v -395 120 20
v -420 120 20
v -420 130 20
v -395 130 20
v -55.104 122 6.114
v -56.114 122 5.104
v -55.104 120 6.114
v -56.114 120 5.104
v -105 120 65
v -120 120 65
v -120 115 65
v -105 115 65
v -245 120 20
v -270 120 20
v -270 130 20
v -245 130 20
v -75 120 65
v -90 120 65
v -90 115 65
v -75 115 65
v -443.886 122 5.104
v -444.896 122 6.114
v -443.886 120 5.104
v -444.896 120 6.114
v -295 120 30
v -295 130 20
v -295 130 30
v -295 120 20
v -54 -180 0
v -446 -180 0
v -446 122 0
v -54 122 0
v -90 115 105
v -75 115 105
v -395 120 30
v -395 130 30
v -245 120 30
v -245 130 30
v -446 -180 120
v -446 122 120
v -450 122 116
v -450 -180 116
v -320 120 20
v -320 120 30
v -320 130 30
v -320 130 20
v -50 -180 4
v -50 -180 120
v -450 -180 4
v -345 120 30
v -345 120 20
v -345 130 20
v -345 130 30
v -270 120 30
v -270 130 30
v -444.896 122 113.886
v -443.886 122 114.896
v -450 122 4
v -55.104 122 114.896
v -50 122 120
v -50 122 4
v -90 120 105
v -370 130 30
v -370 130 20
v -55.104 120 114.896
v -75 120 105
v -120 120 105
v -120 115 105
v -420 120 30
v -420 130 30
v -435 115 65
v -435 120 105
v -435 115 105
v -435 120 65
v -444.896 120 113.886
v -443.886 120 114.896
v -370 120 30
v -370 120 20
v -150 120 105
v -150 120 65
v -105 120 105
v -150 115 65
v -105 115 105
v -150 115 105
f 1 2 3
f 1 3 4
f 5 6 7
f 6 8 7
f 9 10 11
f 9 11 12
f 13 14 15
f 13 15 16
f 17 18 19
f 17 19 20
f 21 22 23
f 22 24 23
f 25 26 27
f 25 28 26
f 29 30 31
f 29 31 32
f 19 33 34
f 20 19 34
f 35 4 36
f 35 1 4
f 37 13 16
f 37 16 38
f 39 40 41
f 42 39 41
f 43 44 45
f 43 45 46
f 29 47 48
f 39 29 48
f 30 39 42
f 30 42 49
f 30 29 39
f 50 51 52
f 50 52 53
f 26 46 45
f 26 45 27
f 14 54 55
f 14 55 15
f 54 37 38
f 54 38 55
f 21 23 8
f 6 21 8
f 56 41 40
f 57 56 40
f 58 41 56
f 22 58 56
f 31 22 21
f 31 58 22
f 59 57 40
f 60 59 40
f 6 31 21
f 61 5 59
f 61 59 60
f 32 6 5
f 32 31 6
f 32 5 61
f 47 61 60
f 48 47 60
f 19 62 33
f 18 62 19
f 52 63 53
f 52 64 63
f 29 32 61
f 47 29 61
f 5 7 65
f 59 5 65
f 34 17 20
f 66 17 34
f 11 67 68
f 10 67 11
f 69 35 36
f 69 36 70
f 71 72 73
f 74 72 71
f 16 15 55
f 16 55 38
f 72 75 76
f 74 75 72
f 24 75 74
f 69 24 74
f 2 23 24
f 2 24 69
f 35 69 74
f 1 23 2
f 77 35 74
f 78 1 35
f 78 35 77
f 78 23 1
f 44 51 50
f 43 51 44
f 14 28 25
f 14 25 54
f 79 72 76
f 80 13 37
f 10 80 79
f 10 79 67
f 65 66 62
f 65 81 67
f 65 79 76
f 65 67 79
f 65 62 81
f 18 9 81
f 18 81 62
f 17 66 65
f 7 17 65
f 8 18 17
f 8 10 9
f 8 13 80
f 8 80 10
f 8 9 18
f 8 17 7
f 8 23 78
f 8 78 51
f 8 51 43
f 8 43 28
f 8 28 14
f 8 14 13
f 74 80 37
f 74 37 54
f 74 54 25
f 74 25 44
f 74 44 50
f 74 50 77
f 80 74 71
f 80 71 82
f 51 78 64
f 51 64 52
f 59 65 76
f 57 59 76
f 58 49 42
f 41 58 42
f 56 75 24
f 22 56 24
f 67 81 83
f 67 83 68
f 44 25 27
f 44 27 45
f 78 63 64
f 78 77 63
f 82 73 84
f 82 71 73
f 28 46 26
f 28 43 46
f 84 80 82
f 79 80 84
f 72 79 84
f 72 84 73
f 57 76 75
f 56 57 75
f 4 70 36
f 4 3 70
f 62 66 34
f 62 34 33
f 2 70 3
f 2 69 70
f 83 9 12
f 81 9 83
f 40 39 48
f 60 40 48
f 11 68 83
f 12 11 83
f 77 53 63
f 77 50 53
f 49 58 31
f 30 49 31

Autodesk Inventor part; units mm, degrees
ref_plane "YZ Plane" through (0, 0, 0) normal (1, 0, 0) x (0, 1, 0)
ref_plane "XZ Plane" through (0, 0, 0) normal (0, 1, 0) x (-1, 0, 0)
ref_plane "XY Plane" through (0, 0, 0) normal (0, 0, 1) x (1, 0, 0)
sketch "Sketch1" plane through (0, 0, 0) normal (0, 0, 1) x (1, 0, 0)
  line L0 (-50, -180) -> (-450, -180)
  line L1 (-450, -180) -> (-450, 120)
  line L2 (-450, 120) -> (-50, 120)
  line L3 (-50, 120) -> (-50, -180)
  point P0 (0, 0)
  dimension "d0" = 50
  dimension "d1" = 300
  dimension "d2" = 400
  dimension "d3" = 120
extrude "Extrusion1" add sketch "Sketch1" along normal blind 120
sketch "Sketch2" plane through (-450, 120, 0) normal (0, 1, 0) x (1, 0, 0)
  line L0 (0, 0) -> (400, 0) projected
  line L1 (0, 0) -> (0, -120) projected
  line L2 (0, -120) -> (400, -120) projected
  line L3 (400, 0) -> (400, -120) projected
  line L4 (205, -30) -> (180, -30)
  line L5 (180, -30) -> (180, -20)
  line L6 (180, -20) -> (205, -20)
  line L7 (205, -20) -> (205, -30)
  dimension "d6" = 25
  dimension "d7" = 10
  dimension "d8" = 20
  dimension "d9" = 220
extrude "Extrusion2" add sketch "Sketch2" along normal blind 10 contours L4 L5 L6 L7
pattern_linear "Rectangular Pattern1" count 4 spacing 50 along (-1, 0, 0) of "Extrusion2"
sketch "Sketch3" plane through (-450, 120, 0) normal (0, 1, 0) x (1, 0, 0)
  line L0 (0, -120) -> (400, -120) projected
  line L1 (400, 0) -> (400, -120) projected
  line L2 (0, 0) -> (400, 0) projected
  line L3 (0, 0) -> (0, -120) projected
  line L4 (15, -65) -> (300, -65)
  line L5 (300, -65) -> (300, -105)
  line L6 (300, -105) -> (15, -105)
  line L7 (15, -105) -> (15, -65)
  line L8 (330, -65) -> (345, -65)
  line L9 (345, -65) -> (345, -105)
  line L10 (345, -105) -> (330, -105)
  line L11 (330, -105) -> (330, -65)
  line L12 (360, -65) -> (375, -65)
  line L13 (375, -65) -> (375, -105)
  line L14 (375, -105) -> (360, -105)
  line L15 (360, -105) -> (360, -65)
  point P0 (450, 0)
  dimension "d15" = 65
  dimension "d16" = 15
  dimension "d17" = 15
  dimension "d18" = 100
  dimension "d21" = 30
  dimension "d22" = 15
  dimension "d23" = 15
extrude "Extrusion3" cut sketch "Sketch3" against normal blind 5 contours L4 L5 L6 L7 | L8 L9 L10 L11 | L12 L13 L14 L15
chamfer "Chamfer1" distance 4 angle 45 3 edges at (-450, -30, 120) (-450, -30, 0) (-50, -30, 0)
sketch "Sketch4" plane through (-446, 120, 0) normal (0, 1, 0) x (1, 0, 0)
  line L0 (392, 0) -> (396, -4) projected
  line L1 (0, 0) -> (392, 0) projected
  line L2 (-4, -4) -> (0, 0) projected
  line L3 (-4, -4) -> (-4, -116) projected
  line L4 (0, -120) -> (-4, -116) projected
  line L5 (0, -120) -> (396, -120) projected
  line L6 (396, -4) -> (396, -120) projected
  line L7 (389.8859, -5.1039) -> (390.8961, -6.1141)
  line L8 (390.8961, -6.1141) -> (390.8961, -114.8961)
  line L9 (390.8961, -114.8961) -> (2.1141, -114.8961)
  line L10 (2.1141, -114.8961) -> (1.1039, -113.8859)
  line L11 (1.1039, -113.8859) -> (1.1039, -6.1141)
  line L12 (1.1039, -6.1141) -> (2.1141, -5.1039)
  line L13 (2.1141, -5.1039) -> (389.8859, -5.1039)
  point P0 (446, 0)
extrude "Extrusion4" add sketch "Sketch4" along normal blind 2
properties part number "AbstractBox"
